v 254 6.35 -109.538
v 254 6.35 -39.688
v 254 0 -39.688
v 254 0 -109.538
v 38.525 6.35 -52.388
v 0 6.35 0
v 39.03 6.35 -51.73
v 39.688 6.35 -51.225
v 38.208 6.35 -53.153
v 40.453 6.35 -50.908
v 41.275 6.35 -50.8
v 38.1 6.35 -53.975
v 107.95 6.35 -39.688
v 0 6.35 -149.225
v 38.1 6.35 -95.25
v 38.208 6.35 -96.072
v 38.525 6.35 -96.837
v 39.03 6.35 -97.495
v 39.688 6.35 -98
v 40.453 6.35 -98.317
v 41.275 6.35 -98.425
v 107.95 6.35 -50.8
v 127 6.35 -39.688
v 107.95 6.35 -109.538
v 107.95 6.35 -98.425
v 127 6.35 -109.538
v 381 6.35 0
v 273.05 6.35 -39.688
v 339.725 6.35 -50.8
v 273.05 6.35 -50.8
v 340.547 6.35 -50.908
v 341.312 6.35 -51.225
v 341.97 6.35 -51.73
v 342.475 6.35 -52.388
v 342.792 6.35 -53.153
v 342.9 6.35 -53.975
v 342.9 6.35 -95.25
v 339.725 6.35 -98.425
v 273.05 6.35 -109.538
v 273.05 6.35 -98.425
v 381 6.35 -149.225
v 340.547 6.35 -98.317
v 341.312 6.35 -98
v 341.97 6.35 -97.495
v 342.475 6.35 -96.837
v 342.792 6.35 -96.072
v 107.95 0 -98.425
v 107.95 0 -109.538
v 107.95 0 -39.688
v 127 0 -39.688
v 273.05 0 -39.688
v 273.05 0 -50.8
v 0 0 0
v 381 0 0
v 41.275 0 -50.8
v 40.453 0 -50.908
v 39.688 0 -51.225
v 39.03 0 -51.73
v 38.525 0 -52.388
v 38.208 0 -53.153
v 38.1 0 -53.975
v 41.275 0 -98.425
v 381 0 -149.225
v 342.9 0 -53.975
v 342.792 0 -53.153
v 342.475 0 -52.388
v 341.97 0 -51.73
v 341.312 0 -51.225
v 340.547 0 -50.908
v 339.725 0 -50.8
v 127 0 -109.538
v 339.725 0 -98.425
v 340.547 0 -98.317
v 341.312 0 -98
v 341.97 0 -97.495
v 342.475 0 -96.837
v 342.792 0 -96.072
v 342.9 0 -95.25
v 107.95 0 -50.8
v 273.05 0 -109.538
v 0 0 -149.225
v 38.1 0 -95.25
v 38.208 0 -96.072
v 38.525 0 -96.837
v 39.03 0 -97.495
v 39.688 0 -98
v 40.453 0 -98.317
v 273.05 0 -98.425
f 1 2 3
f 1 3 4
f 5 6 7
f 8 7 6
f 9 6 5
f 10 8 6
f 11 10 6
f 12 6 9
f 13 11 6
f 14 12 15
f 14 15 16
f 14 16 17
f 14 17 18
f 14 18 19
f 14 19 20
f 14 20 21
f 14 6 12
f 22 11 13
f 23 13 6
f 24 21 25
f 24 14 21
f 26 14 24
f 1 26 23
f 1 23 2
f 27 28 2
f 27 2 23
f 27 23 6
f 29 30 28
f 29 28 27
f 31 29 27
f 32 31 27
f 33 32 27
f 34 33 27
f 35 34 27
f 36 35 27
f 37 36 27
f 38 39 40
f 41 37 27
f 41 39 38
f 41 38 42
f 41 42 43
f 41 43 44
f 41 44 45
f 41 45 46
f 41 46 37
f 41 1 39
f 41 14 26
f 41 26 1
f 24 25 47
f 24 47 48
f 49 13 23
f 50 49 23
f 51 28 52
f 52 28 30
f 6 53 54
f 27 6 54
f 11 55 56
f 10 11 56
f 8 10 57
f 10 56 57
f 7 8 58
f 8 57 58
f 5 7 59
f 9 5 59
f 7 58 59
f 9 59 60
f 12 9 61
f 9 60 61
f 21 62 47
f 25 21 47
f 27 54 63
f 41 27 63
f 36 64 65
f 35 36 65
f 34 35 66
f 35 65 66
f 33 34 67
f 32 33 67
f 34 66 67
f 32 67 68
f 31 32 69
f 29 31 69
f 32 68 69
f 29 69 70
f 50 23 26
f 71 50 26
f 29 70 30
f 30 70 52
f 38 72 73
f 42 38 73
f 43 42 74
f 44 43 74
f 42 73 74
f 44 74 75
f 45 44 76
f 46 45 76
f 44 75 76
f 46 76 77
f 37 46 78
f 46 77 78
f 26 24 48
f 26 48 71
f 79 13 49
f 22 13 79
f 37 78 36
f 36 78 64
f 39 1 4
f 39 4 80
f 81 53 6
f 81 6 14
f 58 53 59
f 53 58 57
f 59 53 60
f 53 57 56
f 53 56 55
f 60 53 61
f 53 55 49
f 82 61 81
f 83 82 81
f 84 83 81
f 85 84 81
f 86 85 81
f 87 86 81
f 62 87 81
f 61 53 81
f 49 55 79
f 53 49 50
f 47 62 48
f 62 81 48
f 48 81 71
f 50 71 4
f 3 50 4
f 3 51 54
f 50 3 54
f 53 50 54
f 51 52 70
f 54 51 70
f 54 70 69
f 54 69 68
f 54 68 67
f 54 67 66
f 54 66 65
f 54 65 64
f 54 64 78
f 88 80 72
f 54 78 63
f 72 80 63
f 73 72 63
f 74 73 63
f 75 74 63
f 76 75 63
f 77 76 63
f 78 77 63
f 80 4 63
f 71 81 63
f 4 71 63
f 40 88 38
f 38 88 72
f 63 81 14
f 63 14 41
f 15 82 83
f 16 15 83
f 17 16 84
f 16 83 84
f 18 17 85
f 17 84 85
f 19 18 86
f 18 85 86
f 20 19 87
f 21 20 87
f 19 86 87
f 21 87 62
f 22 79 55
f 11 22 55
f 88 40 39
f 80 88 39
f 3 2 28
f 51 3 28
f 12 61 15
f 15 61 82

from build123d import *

# Parameters (mm, degrees)
SKETCH1_W           = 381
SKETCH1_H           = 149.225
BOSS_EXTRUDE1_DEPTH = 6.35
SKETCH9_W           = 19.05
SKETCH9_H           = 14.2875
CUT_EXTRUDE1_DEPTH  = 7.62


with BuildPart() as part:
    # Sketch1 → Boss-Extrude1 (new body)
    with BuildSketch(Plane(origin=(0, 0, 0), x_dir=(1, 0, 0), z_dir=(0, 1, 0))):
        with Locations((190.5, 74.6125)):
            Rectangle(SKETCH1_W, SKETCH1_H)
        with BuildLine():
            Line((342.9, 95.25), (342.9, 53.975))
            ThreePointArc((342.9, 53.975), (341.97006403, 51.72993597), (339.725, 50.8))
            Line((339.725, 50.8), (257.175, 50.8))
            ThreePointArc((257.175, 50.8), (254.92993597, 51.72993597), (254, 53.975))
            Line((254, 53.975), (254, 95.25))
            ThreePointArc((254, 95.25), (254.92993597, 97.49506403), (257.175, 98.425))
            Line((257.175, 98.425), (339.725, 98.425))
            ThreePointArc((339.725, 98.425), (341.97006403, 97.49506403), (342.9, 95.25))
        make_face(mode=Mode.SUBTRACT)
        with BuildLine():
            Line((41.275, 98.425), (123.825, 98.425))
            ThreePointArc((123.825, 98.425), (126.07006403, 97.49506403), (127, 95.25))
            Line((127, 95.25), (127, 53.975))
            ThreePointArc((127, 53.975), (126.07006403, 51.72993597), (123.825, 50.8))
            Line((123.825, 50.8), (41.275, 50.8))
            ThreePointArc((41.275, 50.8), (39.02993597, 51.72993597), (38.1, 53.975))
            Line((38.1, 53.975), (38.1, 95.25))
            ThreePointArc((38.1, 95.25), (39.02993597, 97.49506403), (41.275, 98.425))
        make_face(mode=Mode.SUBTRACT)
    extrude(amount=BOSS_EXTRUDE1_DEPTH)

    # Sketch9 → Cut-Extrude1 (cut)
    with BuildSketch(Plane(origin=(0, 6.35, 0), x_dir=(1, 0, 0), z_dir=(0, 1, 0))):
        with Locations((117.475, 102.39375)):
            Rectangle(SKETCH9_W, SKETCH9_H)
        with Locations((117.475, 46.83125)):
            Rectangle(SKETCH9_W, SKETCH9_H)
        with Locations((263.525, 46.83125)):
            Rectangle(SKETCH9_W, SKETCH9_H)
        with Locations((263.525, 102.39375)):
            Rectangle(SKETCH9_W, SKETCH9_H)
    extrude(amount=-CUT_EXTRUDE1_DEPTH, mode=Mode.SUBTRACT)


solid = part.part
